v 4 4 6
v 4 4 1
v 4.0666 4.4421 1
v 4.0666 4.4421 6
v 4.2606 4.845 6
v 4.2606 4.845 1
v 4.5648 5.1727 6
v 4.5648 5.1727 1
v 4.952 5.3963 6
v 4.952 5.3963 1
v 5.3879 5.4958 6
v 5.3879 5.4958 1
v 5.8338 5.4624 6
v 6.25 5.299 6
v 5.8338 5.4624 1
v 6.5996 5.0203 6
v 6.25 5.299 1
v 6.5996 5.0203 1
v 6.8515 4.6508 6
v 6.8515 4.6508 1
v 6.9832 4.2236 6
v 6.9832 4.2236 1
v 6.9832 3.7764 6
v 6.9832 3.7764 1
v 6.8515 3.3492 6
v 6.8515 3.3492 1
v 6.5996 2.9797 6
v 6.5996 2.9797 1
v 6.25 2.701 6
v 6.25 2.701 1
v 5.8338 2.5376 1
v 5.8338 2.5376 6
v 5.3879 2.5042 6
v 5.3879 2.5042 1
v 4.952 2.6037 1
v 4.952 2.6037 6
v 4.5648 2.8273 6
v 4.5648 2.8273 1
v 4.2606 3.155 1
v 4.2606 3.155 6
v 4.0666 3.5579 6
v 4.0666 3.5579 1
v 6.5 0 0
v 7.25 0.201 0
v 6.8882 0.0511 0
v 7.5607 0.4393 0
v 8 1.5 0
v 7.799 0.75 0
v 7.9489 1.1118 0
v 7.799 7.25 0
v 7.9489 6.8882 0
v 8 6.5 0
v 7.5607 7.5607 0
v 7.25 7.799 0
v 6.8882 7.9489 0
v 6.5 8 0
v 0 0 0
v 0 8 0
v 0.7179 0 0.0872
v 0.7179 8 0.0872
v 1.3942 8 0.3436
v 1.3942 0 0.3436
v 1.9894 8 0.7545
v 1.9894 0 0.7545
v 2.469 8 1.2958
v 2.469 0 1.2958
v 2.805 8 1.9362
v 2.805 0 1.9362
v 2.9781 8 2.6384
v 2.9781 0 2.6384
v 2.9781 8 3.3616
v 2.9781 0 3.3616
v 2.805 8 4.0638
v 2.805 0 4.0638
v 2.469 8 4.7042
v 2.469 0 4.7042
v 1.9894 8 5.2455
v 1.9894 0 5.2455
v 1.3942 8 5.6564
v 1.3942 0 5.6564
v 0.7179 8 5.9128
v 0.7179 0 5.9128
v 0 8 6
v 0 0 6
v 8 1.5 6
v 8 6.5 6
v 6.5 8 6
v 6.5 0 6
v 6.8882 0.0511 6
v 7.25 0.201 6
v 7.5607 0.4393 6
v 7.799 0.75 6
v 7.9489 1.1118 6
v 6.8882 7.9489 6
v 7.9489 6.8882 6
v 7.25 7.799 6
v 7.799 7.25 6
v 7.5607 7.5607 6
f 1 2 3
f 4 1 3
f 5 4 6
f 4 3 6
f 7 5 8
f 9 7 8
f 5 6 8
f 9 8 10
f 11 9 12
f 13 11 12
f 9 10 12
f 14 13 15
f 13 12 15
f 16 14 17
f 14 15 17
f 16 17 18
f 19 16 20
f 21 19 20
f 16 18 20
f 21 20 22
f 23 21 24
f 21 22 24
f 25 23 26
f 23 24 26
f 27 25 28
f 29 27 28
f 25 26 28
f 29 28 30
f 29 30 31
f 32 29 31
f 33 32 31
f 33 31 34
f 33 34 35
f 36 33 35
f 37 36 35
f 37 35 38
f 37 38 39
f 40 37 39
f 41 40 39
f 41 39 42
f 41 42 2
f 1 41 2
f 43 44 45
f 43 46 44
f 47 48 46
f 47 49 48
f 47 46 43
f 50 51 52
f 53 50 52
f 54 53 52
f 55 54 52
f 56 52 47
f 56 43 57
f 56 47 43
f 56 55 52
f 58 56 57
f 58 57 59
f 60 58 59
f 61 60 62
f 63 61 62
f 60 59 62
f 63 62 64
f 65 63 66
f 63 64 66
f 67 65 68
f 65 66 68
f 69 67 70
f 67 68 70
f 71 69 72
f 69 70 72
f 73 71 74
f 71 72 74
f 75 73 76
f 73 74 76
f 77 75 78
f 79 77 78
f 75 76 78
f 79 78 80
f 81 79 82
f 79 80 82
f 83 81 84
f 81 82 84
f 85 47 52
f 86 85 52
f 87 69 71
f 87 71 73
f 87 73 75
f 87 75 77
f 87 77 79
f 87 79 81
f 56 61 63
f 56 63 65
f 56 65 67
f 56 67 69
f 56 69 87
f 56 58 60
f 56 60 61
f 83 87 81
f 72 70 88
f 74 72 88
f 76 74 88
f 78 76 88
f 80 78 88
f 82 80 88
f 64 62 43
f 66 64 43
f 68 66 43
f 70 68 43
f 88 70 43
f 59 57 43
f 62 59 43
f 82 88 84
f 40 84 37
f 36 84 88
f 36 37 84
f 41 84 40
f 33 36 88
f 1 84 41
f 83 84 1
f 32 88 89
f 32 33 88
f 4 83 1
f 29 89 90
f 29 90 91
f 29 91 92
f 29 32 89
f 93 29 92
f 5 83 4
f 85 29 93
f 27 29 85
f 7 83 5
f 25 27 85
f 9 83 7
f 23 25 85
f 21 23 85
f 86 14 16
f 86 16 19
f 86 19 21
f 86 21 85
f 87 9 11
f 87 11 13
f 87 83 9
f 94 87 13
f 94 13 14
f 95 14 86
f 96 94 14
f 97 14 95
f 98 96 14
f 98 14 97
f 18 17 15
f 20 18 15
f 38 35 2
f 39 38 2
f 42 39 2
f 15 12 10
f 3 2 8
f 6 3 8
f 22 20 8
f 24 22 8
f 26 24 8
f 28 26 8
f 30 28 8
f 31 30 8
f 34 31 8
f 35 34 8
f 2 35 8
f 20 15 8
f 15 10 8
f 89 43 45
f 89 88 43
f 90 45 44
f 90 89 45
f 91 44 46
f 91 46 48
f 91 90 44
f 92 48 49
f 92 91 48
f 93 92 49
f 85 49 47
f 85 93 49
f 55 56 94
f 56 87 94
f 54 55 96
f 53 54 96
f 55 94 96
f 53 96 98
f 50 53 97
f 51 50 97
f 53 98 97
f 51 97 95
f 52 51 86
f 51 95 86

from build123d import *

# Parameters (mm, degrees)
SKETCH1_W           = 8
SKETCH1_H           = 8
BOSS_EXTRUDE1_DEPTH = 6
SKETCH2_R           = 1.5
CUT_EXTRUDE1_DEPTH  = 6
CUT_EXTRUDE3_DEPTH  = 9
SKETCH4_R           = 1.5
BOSS_EXTRUDE3_DEPTH = 1
FILLET1_R           = 1.5


with BuildPart() as part:
    # Sketch1 → Boss-Extrude1 (new body)
    with BuildSketch(Plane.XY):
        with Locations((4, 4)):
            Rectangle(SKETCH1_W, SKETCH1_H)
    extrude(amount=BOSS_EXTRUDE1_DEPTH)

    # Sketch2 → Cut-Extrude1 (cut)
    with BuildSketch(Plane(origin=(0, 0, 0), x_dir=(-1, 0, 0), z_dir=(0, 0, -1))):
        with Locations((-5.5, 4)):
            Circle(SKETCH2_R)
    extrude(amount=-CUT_EXTRUDE1_DEPTH, mode=Mode.SUBTRACT)

    # Sketch3 → Cut-Extrude3 (cut)
    with BuildSketch(Plane.XZ):
        with BuildLine():
            Line((0, 6), (0, 0))
            ThreePointArc((0, 0), (3, 3), (0, 6))
        make_face()
    extrude(amount=-CUT_EXTRUDE3_DEPTH, mode=Mode.SUBTRACT)

    # Sketch4 → Boss-Extrude3 (add)
    with BuildSketch(Plane(origin=(0, 0, 0), x_dir=(-1, 0, 0), z_dir=(0, 0, -1))):
        with Locations((-5.5, 4)):
            Circle(SKETCH4_R)
    extrude(amount=-BOSS_EXTRUDE3_DEPTH)

    # Fillet1
    fillet1_edges = [part.edges().sort_by_distance(p)[0] for p in [
        (8, 8, 3),
        (8, 0, 3),
    ]]
    fillet(fillet1_edges, radius=FILLET1_R)


solid = part.part
